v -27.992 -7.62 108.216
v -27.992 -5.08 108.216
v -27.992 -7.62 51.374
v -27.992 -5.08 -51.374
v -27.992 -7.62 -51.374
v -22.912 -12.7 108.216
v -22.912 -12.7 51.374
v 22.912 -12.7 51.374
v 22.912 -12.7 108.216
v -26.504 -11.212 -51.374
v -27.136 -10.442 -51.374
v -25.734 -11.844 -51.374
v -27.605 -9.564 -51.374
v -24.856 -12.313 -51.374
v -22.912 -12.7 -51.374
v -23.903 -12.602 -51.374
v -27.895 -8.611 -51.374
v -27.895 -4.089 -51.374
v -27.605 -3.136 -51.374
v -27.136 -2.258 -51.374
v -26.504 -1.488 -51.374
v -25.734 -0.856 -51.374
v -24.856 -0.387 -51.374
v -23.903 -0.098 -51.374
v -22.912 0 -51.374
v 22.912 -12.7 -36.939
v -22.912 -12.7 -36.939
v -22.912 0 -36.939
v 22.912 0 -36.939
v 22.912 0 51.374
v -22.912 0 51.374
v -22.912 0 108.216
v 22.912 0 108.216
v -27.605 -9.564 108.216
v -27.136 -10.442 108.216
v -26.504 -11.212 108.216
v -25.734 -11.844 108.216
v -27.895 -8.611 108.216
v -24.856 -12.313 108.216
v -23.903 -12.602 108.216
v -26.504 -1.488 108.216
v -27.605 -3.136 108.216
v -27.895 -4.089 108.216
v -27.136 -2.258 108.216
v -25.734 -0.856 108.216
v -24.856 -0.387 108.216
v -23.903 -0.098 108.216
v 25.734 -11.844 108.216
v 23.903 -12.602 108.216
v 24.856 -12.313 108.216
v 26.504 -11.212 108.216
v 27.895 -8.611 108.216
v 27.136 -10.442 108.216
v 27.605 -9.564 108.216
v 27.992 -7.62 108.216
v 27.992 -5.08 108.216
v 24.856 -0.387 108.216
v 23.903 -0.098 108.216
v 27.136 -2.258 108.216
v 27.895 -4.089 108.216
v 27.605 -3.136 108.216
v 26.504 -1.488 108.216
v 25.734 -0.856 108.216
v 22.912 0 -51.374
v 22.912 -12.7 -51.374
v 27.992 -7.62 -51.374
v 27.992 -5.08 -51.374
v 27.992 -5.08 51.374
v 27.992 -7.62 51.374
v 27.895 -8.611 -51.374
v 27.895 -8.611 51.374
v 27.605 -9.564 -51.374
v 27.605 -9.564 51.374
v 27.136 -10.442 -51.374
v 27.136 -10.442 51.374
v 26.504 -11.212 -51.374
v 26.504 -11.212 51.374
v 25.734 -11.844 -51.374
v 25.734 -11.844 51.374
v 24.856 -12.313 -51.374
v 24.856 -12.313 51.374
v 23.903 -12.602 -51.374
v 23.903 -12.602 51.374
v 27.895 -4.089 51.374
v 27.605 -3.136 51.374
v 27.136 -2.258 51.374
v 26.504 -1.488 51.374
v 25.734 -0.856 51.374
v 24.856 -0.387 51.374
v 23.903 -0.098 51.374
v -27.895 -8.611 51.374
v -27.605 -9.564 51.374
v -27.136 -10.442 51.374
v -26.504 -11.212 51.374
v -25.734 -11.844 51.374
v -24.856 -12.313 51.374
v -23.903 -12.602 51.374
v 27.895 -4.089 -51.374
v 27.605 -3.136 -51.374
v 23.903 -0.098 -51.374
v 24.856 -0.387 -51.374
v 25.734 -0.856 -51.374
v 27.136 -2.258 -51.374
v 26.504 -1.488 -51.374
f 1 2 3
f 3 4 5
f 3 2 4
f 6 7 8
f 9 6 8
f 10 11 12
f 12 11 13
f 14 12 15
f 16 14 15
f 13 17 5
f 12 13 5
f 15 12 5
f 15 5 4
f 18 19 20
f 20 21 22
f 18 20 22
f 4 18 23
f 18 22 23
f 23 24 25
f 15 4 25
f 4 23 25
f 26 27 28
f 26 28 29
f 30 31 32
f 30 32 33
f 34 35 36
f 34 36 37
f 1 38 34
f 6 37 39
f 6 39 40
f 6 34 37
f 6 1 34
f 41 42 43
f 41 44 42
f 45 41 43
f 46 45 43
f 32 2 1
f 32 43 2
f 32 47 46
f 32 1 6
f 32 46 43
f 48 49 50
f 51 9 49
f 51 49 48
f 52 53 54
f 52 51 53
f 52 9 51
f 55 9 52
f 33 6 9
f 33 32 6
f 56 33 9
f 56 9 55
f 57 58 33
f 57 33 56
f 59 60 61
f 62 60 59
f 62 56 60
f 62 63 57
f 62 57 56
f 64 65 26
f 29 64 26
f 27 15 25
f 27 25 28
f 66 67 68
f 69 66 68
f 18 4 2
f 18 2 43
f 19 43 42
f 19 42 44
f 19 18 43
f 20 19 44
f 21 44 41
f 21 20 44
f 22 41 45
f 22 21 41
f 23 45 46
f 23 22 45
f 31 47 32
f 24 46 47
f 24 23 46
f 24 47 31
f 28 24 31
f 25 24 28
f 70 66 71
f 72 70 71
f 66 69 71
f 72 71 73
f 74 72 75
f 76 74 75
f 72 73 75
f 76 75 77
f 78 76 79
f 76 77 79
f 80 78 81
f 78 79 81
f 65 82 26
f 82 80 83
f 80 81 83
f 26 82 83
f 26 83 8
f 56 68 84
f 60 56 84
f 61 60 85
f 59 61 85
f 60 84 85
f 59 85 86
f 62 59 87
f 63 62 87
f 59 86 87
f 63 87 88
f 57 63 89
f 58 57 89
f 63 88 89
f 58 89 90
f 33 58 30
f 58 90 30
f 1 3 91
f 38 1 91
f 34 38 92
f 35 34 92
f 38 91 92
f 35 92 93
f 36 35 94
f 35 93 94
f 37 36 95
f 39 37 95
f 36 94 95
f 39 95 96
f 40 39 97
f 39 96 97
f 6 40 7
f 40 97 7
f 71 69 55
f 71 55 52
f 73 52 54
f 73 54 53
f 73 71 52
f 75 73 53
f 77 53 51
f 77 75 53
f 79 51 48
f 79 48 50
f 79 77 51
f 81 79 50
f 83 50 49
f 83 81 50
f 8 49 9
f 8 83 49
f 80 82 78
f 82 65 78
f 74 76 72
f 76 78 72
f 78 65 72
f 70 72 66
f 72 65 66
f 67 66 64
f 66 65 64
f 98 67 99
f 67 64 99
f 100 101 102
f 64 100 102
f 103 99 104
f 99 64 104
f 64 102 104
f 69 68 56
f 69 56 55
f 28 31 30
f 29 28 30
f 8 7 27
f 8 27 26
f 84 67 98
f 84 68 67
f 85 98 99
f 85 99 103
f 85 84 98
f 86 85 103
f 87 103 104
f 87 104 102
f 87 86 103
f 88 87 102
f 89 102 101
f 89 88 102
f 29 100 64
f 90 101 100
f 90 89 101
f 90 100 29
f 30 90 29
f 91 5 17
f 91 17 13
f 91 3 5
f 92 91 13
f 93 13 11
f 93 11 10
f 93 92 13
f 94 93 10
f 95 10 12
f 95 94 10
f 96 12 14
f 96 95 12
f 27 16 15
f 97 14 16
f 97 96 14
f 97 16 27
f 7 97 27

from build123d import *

# Parameters (mm, degrees)
F0_W     = 55.9842921793
F0_H     = 102.7474403381
F1_DEPTH = 12.7
F2_R     = 5.08
F3_W     = 45.8242921793
F3_H     = 14.4344866276
F4_DEPTH = 25.4
F8_DEPTH = 56.8421371281


with BuildPart() as f1:
    # F0 (on Front) → F1 (new body)
    with BuildSketch(Plane.XZ):
        Rectangle(F0_W, F0_H)
    extrude(amount=F1_DEPTH)

    # F2
    f2_edges = [f1.edges().sort_by_distance(p)[0] for p in [
        (27.992146, -12.7, 0),
        (27.992146, 0, 0),
        (-27.992146, -12.7, 0),
        (-27.992146, 0, 0),
    ]]
    fillet(f2_edges, radius=F2_R)

    # F3 (on face) → F4 (cut)
    with BuildSketch(Plane.XZ.offset(12.7)):
        with Locations((0, -44.1564768553)):
            Rectangle(F3_W, F3_H)
    extrude(amount=-F4_DEPTH, mode=Mode.SUBTRACT)

    # F8 (add): a face of the model
    f8_faces = [f1.faces().sort_by_distance(p)[0] for p in [
        (0, -6.35, 51.3737201691),
    ]]
    extrude(f8_faces, amount=F8_DEPTH)


solid = f1.part
